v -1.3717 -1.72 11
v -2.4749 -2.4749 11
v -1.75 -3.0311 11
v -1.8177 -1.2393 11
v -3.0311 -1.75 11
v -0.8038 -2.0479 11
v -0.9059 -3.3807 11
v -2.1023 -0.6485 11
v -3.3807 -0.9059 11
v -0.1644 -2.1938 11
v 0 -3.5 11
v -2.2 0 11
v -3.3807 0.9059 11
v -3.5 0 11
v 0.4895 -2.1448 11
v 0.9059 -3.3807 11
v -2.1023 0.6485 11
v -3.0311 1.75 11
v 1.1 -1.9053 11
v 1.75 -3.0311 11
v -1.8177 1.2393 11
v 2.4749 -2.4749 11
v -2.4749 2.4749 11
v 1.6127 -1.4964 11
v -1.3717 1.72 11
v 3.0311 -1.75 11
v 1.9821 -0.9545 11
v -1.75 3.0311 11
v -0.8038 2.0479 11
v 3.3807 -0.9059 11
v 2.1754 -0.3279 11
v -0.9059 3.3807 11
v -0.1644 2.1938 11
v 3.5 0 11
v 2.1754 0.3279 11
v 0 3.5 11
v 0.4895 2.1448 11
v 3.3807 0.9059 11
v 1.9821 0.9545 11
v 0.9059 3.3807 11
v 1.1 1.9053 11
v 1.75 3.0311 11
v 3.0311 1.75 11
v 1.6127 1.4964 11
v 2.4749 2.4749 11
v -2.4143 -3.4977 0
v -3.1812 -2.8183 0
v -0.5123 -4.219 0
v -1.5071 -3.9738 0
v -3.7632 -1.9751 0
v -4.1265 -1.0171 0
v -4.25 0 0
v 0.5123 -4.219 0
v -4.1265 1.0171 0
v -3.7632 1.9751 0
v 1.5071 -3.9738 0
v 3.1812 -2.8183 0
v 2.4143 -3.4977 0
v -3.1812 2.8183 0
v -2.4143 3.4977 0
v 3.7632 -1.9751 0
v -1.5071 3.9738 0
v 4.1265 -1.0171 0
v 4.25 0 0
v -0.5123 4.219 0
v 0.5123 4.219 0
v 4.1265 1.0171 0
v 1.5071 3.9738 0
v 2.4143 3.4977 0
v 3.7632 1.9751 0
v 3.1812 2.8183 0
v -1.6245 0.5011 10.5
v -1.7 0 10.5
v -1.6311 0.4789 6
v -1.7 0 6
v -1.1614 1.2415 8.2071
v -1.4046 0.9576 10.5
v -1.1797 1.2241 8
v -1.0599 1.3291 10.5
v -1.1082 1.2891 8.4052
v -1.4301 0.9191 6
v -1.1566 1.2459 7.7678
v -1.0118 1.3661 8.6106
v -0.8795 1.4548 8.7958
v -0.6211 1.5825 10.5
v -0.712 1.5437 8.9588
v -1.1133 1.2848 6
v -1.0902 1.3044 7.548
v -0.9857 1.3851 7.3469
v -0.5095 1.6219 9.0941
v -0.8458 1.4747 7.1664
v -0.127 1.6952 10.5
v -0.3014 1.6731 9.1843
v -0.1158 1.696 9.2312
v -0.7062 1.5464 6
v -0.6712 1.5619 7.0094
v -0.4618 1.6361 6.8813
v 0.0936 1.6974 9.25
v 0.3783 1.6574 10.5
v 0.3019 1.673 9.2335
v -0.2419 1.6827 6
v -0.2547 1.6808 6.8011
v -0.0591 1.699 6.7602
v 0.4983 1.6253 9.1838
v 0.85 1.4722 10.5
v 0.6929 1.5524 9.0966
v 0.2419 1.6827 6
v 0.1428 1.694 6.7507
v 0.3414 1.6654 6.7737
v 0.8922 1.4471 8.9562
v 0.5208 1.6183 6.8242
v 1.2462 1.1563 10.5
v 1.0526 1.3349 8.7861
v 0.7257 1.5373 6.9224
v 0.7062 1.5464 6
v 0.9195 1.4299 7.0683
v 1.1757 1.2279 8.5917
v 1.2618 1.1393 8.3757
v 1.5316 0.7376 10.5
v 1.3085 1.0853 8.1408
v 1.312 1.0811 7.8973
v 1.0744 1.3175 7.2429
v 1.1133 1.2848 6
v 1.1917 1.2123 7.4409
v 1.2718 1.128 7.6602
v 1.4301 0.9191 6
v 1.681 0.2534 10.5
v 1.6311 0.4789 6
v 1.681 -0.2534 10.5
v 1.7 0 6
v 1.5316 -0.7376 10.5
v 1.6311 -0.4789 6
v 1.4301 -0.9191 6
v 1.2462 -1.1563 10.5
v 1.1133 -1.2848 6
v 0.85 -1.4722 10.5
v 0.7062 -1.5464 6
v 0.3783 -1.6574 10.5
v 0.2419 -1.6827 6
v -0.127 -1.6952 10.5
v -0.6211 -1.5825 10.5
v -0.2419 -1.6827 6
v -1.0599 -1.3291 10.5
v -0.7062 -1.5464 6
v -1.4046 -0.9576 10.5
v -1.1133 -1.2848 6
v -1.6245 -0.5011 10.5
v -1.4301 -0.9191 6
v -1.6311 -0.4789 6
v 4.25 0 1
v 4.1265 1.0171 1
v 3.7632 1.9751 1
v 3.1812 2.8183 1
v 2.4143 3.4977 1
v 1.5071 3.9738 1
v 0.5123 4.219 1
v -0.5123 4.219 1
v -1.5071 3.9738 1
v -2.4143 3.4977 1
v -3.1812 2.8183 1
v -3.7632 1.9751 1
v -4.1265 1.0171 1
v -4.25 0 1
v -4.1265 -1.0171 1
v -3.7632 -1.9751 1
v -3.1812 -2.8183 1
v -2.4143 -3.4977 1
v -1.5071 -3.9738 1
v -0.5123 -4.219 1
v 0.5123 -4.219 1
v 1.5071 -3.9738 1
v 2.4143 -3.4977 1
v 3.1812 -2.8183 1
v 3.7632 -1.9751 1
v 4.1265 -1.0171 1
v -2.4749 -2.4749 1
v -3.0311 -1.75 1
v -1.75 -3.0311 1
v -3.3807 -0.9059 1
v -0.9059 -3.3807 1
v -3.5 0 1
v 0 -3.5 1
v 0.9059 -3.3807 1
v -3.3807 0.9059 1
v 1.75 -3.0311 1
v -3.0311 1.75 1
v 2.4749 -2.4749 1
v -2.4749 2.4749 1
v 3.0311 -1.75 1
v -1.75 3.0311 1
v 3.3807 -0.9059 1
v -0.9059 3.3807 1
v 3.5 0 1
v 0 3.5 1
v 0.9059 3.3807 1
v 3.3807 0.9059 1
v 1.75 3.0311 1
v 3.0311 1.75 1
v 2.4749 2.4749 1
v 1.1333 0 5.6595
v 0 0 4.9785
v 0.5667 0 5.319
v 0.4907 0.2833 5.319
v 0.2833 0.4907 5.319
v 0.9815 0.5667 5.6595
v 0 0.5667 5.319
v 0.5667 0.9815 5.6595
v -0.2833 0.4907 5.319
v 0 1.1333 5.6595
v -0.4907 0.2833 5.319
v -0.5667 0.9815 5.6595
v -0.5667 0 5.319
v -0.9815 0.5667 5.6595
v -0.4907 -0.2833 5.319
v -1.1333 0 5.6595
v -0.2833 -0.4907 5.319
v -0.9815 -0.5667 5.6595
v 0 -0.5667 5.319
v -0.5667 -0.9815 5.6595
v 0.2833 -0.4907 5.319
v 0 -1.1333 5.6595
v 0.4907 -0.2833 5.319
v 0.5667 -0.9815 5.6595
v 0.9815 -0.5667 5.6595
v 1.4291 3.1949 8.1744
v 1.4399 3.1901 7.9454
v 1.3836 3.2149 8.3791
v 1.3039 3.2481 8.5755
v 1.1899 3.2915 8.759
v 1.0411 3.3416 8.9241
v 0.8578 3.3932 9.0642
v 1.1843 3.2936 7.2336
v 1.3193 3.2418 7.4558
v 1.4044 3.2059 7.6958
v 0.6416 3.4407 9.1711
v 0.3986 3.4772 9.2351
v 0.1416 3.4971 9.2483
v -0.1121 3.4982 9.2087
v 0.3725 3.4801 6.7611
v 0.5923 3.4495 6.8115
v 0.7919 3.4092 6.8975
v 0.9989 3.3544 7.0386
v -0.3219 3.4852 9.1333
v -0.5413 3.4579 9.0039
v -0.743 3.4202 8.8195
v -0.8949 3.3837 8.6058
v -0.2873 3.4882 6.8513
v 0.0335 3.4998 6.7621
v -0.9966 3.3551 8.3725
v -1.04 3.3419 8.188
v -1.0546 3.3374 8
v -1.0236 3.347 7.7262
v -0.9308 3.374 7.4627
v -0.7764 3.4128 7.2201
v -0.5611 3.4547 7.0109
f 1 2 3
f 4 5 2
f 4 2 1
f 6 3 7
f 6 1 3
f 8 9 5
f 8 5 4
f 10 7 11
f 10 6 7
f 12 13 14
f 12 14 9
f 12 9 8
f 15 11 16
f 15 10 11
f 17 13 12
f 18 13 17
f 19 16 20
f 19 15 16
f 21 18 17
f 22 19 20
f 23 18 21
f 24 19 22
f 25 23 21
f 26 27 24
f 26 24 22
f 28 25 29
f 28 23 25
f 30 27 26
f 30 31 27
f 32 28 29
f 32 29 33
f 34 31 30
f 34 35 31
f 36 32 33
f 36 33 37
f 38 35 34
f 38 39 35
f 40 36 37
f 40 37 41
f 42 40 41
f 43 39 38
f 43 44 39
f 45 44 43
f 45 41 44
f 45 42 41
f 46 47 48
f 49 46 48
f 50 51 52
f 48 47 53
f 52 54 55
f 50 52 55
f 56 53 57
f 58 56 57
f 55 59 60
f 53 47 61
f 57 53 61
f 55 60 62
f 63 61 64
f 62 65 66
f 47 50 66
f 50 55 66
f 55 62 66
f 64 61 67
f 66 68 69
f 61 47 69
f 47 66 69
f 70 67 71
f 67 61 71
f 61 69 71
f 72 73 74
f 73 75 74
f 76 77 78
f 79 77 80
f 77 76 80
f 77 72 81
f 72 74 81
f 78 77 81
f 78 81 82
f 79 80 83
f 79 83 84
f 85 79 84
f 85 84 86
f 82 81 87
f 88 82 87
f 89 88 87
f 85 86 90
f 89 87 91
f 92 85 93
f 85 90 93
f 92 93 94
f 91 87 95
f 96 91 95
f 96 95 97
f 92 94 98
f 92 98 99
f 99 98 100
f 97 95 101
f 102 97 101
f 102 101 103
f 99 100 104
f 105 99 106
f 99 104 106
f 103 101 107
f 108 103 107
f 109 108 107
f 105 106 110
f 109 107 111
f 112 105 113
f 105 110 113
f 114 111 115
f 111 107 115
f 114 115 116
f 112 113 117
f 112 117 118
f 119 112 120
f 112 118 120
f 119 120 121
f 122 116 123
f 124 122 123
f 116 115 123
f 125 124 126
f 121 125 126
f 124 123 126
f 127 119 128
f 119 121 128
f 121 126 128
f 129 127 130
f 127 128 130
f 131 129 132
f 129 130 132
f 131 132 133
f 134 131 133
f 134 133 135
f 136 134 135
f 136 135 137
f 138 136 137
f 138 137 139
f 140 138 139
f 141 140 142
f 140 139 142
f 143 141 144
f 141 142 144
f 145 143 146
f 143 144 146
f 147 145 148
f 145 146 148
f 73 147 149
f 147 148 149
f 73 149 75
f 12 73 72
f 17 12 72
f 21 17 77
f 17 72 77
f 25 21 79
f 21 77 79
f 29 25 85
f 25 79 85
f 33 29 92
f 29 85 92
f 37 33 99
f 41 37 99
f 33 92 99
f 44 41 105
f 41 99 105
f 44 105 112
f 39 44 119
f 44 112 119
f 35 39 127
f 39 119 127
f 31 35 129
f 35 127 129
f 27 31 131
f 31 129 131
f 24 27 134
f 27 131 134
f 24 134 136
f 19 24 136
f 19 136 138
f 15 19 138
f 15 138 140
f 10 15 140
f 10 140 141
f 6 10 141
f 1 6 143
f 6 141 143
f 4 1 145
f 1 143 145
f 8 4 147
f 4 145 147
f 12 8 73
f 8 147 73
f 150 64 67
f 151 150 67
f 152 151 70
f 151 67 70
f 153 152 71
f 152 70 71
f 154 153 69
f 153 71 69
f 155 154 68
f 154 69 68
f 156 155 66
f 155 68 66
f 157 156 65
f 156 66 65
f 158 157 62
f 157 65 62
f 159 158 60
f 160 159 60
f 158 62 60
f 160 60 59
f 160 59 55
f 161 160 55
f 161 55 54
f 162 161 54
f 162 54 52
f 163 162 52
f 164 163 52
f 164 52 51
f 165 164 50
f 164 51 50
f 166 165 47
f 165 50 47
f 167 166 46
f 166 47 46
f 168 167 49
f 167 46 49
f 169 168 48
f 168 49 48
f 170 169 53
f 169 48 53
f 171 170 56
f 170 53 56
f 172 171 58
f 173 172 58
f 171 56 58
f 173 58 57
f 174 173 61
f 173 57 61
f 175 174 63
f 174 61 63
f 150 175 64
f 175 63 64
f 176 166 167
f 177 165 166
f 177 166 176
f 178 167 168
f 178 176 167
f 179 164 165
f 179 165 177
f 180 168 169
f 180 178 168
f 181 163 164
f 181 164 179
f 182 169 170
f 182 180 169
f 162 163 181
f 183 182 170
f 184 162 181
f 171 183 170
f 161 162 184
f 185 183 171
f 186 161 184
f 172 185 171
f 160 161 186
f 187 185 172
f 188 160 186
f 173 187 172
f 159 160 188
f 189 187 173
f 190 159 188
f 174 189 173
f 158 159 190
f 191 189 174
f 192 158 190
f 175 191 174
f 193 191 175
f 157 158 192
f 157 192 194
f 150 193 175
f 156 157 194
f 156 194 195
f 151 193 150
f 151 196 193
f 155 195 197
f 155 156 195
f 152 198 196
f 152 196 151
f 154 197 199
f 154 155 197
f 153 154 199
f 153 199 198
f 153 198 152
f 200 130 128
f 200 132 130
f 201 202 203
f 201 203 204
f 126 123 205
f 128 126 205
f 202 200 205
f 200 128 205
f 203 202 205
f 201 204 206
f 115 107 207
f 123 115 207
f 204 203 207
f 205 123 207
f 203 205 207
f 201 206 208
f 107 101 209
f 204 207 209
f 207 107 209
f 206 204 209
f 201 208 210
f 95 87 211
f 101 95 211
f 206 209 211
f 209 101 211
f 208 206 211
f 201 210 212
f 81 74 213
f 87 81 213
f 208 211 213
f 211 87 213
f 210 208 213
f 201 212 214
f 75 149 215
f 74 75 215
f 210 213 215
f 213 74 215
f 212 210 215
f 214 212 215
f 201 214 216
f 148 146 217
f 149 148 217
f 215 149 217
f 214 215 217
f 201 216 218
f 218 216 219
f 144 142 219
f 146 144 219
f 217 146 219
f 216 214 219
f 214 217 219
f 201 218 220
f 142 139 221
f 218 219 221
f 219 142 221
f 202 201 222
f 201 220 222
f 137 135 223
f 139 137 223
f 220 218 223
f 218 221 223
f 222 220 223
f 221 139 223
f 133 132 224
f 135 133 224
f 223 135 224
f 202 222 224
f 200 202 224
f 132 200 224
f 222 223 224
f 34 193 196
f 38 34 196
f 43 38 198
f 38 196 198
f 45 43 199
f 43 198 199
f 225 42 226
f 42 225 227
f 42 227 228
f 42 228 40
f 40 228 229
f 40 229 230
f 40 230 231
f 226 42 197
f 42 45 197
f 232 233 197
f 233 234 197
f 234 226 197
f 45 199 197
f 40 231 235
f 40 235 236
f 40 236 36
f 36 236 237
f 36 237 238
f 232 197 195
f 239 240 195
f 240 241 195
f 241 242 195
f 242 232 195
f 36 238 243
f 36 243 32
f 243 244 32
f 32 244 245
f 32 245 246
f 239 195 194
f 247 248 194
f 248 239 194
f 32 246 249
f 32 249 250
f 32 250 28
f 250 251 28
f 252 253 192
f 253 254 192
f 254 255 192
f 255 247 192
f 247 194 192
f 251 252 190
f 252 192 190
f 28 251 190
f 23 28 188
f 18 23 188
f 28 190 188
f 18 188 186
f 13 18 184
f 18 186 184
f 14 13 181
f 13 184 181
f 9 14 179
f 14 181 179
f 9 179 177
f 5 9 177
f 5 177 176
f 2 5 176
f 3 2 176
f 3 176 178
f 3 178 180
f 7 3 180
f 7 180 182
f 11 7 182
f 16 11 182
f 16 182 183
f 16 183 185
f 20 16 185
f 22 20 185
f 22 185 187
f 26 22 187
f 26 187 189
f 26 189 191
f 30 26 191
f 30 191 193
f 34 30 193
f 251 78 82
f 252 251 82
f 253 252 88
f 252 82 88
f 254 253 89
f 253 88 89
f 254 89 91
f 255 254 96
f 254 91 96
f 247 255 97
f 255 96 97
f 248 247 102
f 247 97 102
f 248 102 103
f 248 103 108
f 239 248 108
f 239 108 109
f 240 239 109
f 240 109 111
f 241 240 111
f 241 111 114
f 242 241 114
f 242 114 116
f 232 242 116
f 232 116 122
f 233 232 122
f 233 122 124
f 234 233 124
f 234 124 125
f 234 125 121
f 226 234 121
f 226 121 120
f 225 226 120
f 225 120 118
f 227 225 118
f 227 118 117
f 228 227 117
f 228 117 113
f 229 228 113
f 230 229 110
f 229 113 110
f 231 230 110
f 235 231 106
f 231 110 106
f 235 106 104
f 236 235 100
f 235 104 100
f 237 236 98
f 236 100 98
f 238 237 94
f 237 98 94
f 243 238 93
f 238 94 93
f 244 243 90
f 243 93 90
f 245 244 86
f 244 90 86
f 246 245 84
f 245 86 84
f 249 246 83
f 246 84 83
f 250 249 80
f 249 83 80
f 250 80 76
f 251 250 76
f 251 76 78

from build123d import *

# Parameters (mm, degrees)
SKETCH_1_R              = 4.25
EXTRUDE_1_DEPTH         = 1
SKETCH_2_R              = 3.5
EXTRUDE_2_DEPTH         = 10
HOLE_WIZARD_M31_D       = 3.4
HOLE_WIZARD_M31_DEPTH   = 5
HOLE_WIZARD_M31_TIP     = 1.021463052
CHAMFER_1_SIZE          = 0.5
HOLE_WIZARD_M31_2_D     = 2.5
HOLE_WIZARD_M31_2_DEPTH = 3
HOLE_WIZARD_M31_2_TIP   = 0.751075774


with BuildPart() as part:
    # Эскиз1 → Бобышка-Вытянуть1 (new body)
    with BuildSketch(Plane.XY):
        Circle(SKETCH_1_R)
    extrude(amount=EXTRUDE_1_DEPTH)

    # Эскиз2 → Бобышка-Вытянуть2 (add)
    with BuildSketch(Plane.XY.offset(1)):
        Circle(SKETCH_2_R)
    extrude(amount=EXTRUDE_2_DEPTH)

    # Hole Wizard M31
    with Locations(Plane.XY.offset(11)):
        with Locations((0, 0)):
            Hole(HOLE_WIZARD_M31_D / 2, depth=HOLE_WIZARD_M31_DEPTH)
            with Locations((0, 0, -(HOLE_WIZARD_M31_DEPTH + HOLE_WIZARD_M31_TIP / 2))):  # 118° drill point
                Cone(0, HOLE_WIZARD_M31_D / 2, HOLE_WIZARD_M31_TIP, mode=Mode.SUBTRACT)

    # Фаска1
    chamfer_1_edges = [part.edges().sort_by_distance(p)[0] for p in [
        (1.7, 0, 11),
    ]]
    chamfer(chamfer_1_edges, length=CHAMFER_1_SIZE)

    # Hole Wizard M31 2
    with Locations(Plane(origin=(0.206904612, 3.493879002, 8), x_dir=(0.998251143468, -0.059115603402, 0), z_dir=(0.059115603402, 0.998251143468, 0))):
        with Locations((0, 0)):
            Hole(HOLE_WIZARD_M31_2_D / 2, depth=HOLE_WIZARD_M31_2_DEPTH)
            with Locations((0, 0, -(HOLE_WIZARD_M31_2_DEPTH + HOLE_WIZARD_M31_2_TIP / 2))):  # 118° drill point
                Cone(0, HOLE_WIZARD_M31_2_D / 2, HOLE_WIZARD_M31_2_TIP, mode=Mode.SUBTRACT)


solid = part.part
